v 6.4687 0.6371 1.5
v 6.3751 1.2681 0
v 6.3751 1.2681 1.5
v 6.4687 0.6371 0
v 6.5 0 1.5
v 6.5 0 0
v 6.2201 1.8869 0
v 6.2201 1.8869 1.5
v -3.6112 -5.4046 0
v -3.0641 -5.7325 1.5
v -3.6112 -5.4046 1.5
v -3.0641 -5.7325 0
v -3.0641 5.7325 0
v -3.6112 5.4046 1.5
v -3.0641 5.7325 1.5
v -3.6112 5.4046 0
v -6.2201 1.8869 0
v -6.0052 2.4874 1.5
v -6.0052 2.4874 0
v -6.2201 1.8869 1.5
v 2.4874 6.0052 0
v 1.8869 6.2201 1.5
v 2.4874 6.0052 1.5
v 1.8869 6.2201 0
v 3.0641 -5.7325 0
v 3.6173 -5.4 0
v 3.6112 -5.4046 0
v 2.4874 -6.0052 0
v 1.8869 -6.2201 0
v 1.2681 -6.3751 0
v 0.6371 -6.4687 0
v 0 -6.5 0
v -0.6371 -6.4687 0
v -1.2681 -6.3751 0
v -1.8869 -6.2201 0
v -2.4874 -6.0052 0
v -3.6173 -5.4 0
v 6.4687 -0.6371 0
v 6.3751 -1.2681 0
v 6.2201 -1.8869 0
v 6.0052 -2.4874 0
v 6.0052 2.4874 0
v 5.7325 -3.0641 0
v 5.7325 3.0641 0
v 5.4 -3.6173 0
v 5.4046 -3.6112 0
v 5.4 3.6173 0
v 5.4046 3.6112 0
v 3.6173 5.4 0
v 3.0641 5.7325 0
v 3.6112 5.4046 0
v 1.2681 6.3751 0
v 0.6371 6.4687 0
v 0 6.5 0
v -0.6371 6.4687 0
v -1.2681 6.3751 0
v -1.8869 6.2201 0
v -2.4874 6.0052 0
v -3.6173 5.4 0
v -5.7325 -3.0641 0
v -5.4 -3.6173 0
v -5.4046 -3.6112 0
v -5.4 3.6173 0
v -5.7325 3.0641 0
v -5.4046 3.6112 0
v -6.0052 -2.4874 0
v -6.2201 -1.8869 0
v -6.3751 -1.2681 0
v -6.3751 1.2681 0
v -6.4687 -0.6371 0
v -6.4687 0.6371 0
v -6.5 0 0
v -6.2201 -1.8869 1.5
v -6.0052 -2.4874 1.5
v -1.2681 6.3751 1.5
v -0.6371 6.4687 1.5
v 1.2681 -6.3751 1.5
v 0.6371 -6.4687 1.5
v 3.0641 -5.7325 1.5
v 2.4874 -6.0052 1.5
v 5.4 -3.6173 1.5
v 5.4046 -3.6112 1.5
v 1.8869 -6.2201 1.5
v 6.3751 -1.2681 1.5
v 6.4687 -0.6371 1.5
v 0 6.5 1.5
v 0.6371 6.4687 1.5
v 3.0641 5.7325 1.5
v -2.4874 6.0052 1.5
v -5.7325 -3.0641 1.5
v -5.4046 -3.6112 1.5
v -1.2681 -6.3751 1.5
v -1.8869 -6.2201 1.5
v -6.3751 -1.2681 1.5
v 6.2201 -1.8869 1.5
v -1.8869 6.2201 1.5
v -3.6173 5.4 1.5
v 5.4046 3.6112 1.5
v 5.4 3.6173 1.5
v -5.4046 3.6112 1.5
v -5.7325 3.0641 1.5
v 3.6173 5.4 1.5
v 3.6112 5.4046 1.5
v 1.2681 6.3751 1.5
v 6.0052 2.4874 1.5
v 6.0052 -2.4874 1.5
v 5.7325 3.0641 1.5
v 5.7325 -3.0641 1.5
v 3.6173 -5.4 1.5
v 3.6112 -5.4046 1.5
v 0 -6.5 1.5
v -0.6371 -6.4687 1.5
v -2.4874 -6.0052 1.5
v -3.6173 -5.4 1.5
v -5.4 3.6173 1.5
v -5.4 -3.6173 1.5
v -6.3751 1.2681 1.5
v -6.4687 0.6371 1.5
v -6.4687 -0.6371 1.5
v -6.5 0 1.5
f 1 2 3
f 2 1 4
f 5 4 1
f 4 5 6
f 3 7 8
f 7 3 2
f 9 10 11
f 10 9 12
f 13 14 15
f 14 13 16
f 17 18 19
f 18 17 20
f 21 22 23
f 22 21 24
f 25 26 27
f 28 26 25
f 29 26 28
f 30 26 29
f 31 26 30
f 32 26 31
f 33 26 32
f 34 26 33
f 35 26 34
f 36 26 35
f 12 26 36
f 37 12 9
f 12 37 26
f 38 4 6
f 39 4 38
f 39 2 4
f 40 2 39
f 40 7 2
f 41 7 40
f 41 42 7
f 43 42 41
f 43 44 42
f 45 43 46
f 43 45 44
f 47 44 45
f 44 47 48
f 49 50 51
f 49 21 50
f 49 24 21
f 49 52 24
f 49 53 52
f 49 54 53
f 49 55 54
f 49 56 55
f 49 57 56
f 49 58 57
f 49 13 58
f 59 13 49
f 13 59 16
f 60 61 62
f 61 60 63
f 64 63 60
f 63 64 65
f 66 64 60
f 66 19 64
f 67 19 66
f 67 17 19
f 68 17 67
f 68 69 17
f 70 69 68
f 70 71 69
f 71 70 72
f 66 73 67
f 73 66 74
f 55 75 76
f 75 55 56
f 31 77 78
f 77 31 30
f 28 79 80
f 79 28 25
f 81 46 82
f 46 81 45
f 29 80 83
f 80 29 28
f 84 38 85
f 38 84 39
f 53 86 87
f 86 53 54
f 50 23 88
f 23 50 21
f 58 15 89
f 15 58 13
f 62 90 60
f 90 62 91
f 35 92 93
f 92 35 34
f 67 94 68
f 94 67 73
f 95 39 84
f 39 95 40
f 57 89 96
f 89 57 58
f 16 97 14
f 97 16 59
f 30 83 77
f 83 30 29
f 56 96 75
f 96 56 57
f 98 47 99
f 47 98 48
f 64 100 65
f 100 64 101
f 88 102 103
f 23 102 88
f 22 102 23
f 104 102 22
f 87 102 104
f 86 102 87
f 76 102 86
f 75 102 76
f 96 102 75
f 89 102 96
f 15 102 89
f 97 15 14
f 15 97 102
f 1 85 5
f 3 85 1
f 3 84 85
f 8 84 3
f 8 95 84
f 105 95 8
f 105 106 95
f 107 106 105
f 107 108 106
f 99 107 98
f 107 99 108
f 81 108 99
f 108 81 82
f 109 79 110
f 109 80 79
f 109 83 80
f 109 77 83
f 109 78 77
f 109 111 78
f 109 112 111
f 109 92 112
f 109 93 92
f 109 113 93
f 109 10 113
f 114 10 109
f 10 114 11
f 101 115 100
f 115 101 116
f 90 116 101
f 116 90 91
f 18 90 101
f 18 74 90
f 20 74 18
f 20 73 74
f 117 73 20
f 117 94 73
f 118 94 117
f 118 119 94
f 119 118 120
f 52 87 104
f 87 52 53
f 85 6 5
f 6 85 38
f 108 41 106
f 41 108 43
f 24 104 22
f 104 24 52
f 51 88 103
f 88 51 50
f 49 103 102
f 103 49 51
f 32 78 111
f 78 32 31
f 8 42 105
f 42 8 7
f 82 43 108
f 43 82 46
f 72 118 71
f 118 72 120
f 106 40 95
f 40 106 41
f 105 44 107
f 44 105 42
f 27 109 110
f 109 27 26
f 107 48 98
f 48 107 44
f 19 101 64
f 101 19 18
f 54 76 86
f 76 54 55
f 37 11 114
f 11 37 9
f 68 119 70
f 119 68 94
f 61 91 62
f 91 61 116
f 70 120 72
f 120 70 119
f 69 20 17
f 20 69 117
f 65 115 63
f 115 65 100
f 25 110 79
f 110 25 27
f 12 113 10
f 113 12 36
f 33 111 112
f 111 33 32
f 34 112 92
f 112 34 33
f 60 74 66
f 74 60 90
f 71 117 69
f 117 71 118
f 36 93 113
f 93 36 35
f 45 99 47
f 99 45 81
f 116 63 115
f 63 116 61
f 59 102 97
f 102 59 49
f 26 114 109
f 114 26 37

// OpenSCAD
// Adapter sleeve for 0.2 mL PCR tube in a 1.5 mL rack hole
// Designed to fit 0.2 mL tube into a 1.5 mL rack hole
// Print orientation: collar on z=0 to z=1.5, body from z=1.5 to z=21.5
// Features:
// - Collar: 13 mm diameter, 1.5 mm thick, at z=0 to z=1.5
// - Sleeve body: 10.8 mm outer diameter, from z=1.5 to z=21.5
// - Full 6.2 mm bore through entire height, open at both ends

$fn = 64;

// Dimensions in millimeters
collar_diameter = 13.0;
collar_thickness = 1.5;
sleeve_outer_diameter = 10.8;
sleeve_height = 20.0;  // Corrected: from z=1.5 to z=21.5 is 20.0 mm height, not 21.5
bore_diameter = 6.2;
bore_radius = bore_diameter / 2;

// Corrected: The sleeve body must rise from z=1.5 to z=21.5, so total height is 20.0 mm
// The full part must have:
// - A collar from z=0 to z=1.5
// - A body from z=1.5 to z=21.5 (height = 20.0 mm)
// - A central bore from z=0 to z=23.0 (full height of collar + body)

difference() {
    // Base: collar (13 mm diameter, 1.5 mm thick)
    translate([0, 0, 0])
        cylinder(r = collar_diameter / 2, h = collar_thickness, $fn = 64);

    // Sleeve body: 10.8 mm outer diameter, from z=1.5 to z=21.5 (height = 20.0 mm)
    translate([0, 0, collar_thickness])
        cube([sleeve_outer_diameter, sleeve_outer_diameter, sleeve_height], center = true);

    // Central bore: 6.2 mm diameter, full height (from z=0 to z=23.0)
    // The bore must go through the entire part, from z=0 to z=23.0
    // But the part only exists from z=0 to z=21.5, so we must ensure the bore is fully inside
    // The bore should extend from z=0 to z=23.0, but the part only exists up to z=21.5
    // So we must make the bore go through the full height of the part (z=0 to z=21.5 + 1.5 = 23.0)
    translate([0, 0, 0])
        cylinder(r = bore_radius, h = 23.0, $fn = 64);
}
